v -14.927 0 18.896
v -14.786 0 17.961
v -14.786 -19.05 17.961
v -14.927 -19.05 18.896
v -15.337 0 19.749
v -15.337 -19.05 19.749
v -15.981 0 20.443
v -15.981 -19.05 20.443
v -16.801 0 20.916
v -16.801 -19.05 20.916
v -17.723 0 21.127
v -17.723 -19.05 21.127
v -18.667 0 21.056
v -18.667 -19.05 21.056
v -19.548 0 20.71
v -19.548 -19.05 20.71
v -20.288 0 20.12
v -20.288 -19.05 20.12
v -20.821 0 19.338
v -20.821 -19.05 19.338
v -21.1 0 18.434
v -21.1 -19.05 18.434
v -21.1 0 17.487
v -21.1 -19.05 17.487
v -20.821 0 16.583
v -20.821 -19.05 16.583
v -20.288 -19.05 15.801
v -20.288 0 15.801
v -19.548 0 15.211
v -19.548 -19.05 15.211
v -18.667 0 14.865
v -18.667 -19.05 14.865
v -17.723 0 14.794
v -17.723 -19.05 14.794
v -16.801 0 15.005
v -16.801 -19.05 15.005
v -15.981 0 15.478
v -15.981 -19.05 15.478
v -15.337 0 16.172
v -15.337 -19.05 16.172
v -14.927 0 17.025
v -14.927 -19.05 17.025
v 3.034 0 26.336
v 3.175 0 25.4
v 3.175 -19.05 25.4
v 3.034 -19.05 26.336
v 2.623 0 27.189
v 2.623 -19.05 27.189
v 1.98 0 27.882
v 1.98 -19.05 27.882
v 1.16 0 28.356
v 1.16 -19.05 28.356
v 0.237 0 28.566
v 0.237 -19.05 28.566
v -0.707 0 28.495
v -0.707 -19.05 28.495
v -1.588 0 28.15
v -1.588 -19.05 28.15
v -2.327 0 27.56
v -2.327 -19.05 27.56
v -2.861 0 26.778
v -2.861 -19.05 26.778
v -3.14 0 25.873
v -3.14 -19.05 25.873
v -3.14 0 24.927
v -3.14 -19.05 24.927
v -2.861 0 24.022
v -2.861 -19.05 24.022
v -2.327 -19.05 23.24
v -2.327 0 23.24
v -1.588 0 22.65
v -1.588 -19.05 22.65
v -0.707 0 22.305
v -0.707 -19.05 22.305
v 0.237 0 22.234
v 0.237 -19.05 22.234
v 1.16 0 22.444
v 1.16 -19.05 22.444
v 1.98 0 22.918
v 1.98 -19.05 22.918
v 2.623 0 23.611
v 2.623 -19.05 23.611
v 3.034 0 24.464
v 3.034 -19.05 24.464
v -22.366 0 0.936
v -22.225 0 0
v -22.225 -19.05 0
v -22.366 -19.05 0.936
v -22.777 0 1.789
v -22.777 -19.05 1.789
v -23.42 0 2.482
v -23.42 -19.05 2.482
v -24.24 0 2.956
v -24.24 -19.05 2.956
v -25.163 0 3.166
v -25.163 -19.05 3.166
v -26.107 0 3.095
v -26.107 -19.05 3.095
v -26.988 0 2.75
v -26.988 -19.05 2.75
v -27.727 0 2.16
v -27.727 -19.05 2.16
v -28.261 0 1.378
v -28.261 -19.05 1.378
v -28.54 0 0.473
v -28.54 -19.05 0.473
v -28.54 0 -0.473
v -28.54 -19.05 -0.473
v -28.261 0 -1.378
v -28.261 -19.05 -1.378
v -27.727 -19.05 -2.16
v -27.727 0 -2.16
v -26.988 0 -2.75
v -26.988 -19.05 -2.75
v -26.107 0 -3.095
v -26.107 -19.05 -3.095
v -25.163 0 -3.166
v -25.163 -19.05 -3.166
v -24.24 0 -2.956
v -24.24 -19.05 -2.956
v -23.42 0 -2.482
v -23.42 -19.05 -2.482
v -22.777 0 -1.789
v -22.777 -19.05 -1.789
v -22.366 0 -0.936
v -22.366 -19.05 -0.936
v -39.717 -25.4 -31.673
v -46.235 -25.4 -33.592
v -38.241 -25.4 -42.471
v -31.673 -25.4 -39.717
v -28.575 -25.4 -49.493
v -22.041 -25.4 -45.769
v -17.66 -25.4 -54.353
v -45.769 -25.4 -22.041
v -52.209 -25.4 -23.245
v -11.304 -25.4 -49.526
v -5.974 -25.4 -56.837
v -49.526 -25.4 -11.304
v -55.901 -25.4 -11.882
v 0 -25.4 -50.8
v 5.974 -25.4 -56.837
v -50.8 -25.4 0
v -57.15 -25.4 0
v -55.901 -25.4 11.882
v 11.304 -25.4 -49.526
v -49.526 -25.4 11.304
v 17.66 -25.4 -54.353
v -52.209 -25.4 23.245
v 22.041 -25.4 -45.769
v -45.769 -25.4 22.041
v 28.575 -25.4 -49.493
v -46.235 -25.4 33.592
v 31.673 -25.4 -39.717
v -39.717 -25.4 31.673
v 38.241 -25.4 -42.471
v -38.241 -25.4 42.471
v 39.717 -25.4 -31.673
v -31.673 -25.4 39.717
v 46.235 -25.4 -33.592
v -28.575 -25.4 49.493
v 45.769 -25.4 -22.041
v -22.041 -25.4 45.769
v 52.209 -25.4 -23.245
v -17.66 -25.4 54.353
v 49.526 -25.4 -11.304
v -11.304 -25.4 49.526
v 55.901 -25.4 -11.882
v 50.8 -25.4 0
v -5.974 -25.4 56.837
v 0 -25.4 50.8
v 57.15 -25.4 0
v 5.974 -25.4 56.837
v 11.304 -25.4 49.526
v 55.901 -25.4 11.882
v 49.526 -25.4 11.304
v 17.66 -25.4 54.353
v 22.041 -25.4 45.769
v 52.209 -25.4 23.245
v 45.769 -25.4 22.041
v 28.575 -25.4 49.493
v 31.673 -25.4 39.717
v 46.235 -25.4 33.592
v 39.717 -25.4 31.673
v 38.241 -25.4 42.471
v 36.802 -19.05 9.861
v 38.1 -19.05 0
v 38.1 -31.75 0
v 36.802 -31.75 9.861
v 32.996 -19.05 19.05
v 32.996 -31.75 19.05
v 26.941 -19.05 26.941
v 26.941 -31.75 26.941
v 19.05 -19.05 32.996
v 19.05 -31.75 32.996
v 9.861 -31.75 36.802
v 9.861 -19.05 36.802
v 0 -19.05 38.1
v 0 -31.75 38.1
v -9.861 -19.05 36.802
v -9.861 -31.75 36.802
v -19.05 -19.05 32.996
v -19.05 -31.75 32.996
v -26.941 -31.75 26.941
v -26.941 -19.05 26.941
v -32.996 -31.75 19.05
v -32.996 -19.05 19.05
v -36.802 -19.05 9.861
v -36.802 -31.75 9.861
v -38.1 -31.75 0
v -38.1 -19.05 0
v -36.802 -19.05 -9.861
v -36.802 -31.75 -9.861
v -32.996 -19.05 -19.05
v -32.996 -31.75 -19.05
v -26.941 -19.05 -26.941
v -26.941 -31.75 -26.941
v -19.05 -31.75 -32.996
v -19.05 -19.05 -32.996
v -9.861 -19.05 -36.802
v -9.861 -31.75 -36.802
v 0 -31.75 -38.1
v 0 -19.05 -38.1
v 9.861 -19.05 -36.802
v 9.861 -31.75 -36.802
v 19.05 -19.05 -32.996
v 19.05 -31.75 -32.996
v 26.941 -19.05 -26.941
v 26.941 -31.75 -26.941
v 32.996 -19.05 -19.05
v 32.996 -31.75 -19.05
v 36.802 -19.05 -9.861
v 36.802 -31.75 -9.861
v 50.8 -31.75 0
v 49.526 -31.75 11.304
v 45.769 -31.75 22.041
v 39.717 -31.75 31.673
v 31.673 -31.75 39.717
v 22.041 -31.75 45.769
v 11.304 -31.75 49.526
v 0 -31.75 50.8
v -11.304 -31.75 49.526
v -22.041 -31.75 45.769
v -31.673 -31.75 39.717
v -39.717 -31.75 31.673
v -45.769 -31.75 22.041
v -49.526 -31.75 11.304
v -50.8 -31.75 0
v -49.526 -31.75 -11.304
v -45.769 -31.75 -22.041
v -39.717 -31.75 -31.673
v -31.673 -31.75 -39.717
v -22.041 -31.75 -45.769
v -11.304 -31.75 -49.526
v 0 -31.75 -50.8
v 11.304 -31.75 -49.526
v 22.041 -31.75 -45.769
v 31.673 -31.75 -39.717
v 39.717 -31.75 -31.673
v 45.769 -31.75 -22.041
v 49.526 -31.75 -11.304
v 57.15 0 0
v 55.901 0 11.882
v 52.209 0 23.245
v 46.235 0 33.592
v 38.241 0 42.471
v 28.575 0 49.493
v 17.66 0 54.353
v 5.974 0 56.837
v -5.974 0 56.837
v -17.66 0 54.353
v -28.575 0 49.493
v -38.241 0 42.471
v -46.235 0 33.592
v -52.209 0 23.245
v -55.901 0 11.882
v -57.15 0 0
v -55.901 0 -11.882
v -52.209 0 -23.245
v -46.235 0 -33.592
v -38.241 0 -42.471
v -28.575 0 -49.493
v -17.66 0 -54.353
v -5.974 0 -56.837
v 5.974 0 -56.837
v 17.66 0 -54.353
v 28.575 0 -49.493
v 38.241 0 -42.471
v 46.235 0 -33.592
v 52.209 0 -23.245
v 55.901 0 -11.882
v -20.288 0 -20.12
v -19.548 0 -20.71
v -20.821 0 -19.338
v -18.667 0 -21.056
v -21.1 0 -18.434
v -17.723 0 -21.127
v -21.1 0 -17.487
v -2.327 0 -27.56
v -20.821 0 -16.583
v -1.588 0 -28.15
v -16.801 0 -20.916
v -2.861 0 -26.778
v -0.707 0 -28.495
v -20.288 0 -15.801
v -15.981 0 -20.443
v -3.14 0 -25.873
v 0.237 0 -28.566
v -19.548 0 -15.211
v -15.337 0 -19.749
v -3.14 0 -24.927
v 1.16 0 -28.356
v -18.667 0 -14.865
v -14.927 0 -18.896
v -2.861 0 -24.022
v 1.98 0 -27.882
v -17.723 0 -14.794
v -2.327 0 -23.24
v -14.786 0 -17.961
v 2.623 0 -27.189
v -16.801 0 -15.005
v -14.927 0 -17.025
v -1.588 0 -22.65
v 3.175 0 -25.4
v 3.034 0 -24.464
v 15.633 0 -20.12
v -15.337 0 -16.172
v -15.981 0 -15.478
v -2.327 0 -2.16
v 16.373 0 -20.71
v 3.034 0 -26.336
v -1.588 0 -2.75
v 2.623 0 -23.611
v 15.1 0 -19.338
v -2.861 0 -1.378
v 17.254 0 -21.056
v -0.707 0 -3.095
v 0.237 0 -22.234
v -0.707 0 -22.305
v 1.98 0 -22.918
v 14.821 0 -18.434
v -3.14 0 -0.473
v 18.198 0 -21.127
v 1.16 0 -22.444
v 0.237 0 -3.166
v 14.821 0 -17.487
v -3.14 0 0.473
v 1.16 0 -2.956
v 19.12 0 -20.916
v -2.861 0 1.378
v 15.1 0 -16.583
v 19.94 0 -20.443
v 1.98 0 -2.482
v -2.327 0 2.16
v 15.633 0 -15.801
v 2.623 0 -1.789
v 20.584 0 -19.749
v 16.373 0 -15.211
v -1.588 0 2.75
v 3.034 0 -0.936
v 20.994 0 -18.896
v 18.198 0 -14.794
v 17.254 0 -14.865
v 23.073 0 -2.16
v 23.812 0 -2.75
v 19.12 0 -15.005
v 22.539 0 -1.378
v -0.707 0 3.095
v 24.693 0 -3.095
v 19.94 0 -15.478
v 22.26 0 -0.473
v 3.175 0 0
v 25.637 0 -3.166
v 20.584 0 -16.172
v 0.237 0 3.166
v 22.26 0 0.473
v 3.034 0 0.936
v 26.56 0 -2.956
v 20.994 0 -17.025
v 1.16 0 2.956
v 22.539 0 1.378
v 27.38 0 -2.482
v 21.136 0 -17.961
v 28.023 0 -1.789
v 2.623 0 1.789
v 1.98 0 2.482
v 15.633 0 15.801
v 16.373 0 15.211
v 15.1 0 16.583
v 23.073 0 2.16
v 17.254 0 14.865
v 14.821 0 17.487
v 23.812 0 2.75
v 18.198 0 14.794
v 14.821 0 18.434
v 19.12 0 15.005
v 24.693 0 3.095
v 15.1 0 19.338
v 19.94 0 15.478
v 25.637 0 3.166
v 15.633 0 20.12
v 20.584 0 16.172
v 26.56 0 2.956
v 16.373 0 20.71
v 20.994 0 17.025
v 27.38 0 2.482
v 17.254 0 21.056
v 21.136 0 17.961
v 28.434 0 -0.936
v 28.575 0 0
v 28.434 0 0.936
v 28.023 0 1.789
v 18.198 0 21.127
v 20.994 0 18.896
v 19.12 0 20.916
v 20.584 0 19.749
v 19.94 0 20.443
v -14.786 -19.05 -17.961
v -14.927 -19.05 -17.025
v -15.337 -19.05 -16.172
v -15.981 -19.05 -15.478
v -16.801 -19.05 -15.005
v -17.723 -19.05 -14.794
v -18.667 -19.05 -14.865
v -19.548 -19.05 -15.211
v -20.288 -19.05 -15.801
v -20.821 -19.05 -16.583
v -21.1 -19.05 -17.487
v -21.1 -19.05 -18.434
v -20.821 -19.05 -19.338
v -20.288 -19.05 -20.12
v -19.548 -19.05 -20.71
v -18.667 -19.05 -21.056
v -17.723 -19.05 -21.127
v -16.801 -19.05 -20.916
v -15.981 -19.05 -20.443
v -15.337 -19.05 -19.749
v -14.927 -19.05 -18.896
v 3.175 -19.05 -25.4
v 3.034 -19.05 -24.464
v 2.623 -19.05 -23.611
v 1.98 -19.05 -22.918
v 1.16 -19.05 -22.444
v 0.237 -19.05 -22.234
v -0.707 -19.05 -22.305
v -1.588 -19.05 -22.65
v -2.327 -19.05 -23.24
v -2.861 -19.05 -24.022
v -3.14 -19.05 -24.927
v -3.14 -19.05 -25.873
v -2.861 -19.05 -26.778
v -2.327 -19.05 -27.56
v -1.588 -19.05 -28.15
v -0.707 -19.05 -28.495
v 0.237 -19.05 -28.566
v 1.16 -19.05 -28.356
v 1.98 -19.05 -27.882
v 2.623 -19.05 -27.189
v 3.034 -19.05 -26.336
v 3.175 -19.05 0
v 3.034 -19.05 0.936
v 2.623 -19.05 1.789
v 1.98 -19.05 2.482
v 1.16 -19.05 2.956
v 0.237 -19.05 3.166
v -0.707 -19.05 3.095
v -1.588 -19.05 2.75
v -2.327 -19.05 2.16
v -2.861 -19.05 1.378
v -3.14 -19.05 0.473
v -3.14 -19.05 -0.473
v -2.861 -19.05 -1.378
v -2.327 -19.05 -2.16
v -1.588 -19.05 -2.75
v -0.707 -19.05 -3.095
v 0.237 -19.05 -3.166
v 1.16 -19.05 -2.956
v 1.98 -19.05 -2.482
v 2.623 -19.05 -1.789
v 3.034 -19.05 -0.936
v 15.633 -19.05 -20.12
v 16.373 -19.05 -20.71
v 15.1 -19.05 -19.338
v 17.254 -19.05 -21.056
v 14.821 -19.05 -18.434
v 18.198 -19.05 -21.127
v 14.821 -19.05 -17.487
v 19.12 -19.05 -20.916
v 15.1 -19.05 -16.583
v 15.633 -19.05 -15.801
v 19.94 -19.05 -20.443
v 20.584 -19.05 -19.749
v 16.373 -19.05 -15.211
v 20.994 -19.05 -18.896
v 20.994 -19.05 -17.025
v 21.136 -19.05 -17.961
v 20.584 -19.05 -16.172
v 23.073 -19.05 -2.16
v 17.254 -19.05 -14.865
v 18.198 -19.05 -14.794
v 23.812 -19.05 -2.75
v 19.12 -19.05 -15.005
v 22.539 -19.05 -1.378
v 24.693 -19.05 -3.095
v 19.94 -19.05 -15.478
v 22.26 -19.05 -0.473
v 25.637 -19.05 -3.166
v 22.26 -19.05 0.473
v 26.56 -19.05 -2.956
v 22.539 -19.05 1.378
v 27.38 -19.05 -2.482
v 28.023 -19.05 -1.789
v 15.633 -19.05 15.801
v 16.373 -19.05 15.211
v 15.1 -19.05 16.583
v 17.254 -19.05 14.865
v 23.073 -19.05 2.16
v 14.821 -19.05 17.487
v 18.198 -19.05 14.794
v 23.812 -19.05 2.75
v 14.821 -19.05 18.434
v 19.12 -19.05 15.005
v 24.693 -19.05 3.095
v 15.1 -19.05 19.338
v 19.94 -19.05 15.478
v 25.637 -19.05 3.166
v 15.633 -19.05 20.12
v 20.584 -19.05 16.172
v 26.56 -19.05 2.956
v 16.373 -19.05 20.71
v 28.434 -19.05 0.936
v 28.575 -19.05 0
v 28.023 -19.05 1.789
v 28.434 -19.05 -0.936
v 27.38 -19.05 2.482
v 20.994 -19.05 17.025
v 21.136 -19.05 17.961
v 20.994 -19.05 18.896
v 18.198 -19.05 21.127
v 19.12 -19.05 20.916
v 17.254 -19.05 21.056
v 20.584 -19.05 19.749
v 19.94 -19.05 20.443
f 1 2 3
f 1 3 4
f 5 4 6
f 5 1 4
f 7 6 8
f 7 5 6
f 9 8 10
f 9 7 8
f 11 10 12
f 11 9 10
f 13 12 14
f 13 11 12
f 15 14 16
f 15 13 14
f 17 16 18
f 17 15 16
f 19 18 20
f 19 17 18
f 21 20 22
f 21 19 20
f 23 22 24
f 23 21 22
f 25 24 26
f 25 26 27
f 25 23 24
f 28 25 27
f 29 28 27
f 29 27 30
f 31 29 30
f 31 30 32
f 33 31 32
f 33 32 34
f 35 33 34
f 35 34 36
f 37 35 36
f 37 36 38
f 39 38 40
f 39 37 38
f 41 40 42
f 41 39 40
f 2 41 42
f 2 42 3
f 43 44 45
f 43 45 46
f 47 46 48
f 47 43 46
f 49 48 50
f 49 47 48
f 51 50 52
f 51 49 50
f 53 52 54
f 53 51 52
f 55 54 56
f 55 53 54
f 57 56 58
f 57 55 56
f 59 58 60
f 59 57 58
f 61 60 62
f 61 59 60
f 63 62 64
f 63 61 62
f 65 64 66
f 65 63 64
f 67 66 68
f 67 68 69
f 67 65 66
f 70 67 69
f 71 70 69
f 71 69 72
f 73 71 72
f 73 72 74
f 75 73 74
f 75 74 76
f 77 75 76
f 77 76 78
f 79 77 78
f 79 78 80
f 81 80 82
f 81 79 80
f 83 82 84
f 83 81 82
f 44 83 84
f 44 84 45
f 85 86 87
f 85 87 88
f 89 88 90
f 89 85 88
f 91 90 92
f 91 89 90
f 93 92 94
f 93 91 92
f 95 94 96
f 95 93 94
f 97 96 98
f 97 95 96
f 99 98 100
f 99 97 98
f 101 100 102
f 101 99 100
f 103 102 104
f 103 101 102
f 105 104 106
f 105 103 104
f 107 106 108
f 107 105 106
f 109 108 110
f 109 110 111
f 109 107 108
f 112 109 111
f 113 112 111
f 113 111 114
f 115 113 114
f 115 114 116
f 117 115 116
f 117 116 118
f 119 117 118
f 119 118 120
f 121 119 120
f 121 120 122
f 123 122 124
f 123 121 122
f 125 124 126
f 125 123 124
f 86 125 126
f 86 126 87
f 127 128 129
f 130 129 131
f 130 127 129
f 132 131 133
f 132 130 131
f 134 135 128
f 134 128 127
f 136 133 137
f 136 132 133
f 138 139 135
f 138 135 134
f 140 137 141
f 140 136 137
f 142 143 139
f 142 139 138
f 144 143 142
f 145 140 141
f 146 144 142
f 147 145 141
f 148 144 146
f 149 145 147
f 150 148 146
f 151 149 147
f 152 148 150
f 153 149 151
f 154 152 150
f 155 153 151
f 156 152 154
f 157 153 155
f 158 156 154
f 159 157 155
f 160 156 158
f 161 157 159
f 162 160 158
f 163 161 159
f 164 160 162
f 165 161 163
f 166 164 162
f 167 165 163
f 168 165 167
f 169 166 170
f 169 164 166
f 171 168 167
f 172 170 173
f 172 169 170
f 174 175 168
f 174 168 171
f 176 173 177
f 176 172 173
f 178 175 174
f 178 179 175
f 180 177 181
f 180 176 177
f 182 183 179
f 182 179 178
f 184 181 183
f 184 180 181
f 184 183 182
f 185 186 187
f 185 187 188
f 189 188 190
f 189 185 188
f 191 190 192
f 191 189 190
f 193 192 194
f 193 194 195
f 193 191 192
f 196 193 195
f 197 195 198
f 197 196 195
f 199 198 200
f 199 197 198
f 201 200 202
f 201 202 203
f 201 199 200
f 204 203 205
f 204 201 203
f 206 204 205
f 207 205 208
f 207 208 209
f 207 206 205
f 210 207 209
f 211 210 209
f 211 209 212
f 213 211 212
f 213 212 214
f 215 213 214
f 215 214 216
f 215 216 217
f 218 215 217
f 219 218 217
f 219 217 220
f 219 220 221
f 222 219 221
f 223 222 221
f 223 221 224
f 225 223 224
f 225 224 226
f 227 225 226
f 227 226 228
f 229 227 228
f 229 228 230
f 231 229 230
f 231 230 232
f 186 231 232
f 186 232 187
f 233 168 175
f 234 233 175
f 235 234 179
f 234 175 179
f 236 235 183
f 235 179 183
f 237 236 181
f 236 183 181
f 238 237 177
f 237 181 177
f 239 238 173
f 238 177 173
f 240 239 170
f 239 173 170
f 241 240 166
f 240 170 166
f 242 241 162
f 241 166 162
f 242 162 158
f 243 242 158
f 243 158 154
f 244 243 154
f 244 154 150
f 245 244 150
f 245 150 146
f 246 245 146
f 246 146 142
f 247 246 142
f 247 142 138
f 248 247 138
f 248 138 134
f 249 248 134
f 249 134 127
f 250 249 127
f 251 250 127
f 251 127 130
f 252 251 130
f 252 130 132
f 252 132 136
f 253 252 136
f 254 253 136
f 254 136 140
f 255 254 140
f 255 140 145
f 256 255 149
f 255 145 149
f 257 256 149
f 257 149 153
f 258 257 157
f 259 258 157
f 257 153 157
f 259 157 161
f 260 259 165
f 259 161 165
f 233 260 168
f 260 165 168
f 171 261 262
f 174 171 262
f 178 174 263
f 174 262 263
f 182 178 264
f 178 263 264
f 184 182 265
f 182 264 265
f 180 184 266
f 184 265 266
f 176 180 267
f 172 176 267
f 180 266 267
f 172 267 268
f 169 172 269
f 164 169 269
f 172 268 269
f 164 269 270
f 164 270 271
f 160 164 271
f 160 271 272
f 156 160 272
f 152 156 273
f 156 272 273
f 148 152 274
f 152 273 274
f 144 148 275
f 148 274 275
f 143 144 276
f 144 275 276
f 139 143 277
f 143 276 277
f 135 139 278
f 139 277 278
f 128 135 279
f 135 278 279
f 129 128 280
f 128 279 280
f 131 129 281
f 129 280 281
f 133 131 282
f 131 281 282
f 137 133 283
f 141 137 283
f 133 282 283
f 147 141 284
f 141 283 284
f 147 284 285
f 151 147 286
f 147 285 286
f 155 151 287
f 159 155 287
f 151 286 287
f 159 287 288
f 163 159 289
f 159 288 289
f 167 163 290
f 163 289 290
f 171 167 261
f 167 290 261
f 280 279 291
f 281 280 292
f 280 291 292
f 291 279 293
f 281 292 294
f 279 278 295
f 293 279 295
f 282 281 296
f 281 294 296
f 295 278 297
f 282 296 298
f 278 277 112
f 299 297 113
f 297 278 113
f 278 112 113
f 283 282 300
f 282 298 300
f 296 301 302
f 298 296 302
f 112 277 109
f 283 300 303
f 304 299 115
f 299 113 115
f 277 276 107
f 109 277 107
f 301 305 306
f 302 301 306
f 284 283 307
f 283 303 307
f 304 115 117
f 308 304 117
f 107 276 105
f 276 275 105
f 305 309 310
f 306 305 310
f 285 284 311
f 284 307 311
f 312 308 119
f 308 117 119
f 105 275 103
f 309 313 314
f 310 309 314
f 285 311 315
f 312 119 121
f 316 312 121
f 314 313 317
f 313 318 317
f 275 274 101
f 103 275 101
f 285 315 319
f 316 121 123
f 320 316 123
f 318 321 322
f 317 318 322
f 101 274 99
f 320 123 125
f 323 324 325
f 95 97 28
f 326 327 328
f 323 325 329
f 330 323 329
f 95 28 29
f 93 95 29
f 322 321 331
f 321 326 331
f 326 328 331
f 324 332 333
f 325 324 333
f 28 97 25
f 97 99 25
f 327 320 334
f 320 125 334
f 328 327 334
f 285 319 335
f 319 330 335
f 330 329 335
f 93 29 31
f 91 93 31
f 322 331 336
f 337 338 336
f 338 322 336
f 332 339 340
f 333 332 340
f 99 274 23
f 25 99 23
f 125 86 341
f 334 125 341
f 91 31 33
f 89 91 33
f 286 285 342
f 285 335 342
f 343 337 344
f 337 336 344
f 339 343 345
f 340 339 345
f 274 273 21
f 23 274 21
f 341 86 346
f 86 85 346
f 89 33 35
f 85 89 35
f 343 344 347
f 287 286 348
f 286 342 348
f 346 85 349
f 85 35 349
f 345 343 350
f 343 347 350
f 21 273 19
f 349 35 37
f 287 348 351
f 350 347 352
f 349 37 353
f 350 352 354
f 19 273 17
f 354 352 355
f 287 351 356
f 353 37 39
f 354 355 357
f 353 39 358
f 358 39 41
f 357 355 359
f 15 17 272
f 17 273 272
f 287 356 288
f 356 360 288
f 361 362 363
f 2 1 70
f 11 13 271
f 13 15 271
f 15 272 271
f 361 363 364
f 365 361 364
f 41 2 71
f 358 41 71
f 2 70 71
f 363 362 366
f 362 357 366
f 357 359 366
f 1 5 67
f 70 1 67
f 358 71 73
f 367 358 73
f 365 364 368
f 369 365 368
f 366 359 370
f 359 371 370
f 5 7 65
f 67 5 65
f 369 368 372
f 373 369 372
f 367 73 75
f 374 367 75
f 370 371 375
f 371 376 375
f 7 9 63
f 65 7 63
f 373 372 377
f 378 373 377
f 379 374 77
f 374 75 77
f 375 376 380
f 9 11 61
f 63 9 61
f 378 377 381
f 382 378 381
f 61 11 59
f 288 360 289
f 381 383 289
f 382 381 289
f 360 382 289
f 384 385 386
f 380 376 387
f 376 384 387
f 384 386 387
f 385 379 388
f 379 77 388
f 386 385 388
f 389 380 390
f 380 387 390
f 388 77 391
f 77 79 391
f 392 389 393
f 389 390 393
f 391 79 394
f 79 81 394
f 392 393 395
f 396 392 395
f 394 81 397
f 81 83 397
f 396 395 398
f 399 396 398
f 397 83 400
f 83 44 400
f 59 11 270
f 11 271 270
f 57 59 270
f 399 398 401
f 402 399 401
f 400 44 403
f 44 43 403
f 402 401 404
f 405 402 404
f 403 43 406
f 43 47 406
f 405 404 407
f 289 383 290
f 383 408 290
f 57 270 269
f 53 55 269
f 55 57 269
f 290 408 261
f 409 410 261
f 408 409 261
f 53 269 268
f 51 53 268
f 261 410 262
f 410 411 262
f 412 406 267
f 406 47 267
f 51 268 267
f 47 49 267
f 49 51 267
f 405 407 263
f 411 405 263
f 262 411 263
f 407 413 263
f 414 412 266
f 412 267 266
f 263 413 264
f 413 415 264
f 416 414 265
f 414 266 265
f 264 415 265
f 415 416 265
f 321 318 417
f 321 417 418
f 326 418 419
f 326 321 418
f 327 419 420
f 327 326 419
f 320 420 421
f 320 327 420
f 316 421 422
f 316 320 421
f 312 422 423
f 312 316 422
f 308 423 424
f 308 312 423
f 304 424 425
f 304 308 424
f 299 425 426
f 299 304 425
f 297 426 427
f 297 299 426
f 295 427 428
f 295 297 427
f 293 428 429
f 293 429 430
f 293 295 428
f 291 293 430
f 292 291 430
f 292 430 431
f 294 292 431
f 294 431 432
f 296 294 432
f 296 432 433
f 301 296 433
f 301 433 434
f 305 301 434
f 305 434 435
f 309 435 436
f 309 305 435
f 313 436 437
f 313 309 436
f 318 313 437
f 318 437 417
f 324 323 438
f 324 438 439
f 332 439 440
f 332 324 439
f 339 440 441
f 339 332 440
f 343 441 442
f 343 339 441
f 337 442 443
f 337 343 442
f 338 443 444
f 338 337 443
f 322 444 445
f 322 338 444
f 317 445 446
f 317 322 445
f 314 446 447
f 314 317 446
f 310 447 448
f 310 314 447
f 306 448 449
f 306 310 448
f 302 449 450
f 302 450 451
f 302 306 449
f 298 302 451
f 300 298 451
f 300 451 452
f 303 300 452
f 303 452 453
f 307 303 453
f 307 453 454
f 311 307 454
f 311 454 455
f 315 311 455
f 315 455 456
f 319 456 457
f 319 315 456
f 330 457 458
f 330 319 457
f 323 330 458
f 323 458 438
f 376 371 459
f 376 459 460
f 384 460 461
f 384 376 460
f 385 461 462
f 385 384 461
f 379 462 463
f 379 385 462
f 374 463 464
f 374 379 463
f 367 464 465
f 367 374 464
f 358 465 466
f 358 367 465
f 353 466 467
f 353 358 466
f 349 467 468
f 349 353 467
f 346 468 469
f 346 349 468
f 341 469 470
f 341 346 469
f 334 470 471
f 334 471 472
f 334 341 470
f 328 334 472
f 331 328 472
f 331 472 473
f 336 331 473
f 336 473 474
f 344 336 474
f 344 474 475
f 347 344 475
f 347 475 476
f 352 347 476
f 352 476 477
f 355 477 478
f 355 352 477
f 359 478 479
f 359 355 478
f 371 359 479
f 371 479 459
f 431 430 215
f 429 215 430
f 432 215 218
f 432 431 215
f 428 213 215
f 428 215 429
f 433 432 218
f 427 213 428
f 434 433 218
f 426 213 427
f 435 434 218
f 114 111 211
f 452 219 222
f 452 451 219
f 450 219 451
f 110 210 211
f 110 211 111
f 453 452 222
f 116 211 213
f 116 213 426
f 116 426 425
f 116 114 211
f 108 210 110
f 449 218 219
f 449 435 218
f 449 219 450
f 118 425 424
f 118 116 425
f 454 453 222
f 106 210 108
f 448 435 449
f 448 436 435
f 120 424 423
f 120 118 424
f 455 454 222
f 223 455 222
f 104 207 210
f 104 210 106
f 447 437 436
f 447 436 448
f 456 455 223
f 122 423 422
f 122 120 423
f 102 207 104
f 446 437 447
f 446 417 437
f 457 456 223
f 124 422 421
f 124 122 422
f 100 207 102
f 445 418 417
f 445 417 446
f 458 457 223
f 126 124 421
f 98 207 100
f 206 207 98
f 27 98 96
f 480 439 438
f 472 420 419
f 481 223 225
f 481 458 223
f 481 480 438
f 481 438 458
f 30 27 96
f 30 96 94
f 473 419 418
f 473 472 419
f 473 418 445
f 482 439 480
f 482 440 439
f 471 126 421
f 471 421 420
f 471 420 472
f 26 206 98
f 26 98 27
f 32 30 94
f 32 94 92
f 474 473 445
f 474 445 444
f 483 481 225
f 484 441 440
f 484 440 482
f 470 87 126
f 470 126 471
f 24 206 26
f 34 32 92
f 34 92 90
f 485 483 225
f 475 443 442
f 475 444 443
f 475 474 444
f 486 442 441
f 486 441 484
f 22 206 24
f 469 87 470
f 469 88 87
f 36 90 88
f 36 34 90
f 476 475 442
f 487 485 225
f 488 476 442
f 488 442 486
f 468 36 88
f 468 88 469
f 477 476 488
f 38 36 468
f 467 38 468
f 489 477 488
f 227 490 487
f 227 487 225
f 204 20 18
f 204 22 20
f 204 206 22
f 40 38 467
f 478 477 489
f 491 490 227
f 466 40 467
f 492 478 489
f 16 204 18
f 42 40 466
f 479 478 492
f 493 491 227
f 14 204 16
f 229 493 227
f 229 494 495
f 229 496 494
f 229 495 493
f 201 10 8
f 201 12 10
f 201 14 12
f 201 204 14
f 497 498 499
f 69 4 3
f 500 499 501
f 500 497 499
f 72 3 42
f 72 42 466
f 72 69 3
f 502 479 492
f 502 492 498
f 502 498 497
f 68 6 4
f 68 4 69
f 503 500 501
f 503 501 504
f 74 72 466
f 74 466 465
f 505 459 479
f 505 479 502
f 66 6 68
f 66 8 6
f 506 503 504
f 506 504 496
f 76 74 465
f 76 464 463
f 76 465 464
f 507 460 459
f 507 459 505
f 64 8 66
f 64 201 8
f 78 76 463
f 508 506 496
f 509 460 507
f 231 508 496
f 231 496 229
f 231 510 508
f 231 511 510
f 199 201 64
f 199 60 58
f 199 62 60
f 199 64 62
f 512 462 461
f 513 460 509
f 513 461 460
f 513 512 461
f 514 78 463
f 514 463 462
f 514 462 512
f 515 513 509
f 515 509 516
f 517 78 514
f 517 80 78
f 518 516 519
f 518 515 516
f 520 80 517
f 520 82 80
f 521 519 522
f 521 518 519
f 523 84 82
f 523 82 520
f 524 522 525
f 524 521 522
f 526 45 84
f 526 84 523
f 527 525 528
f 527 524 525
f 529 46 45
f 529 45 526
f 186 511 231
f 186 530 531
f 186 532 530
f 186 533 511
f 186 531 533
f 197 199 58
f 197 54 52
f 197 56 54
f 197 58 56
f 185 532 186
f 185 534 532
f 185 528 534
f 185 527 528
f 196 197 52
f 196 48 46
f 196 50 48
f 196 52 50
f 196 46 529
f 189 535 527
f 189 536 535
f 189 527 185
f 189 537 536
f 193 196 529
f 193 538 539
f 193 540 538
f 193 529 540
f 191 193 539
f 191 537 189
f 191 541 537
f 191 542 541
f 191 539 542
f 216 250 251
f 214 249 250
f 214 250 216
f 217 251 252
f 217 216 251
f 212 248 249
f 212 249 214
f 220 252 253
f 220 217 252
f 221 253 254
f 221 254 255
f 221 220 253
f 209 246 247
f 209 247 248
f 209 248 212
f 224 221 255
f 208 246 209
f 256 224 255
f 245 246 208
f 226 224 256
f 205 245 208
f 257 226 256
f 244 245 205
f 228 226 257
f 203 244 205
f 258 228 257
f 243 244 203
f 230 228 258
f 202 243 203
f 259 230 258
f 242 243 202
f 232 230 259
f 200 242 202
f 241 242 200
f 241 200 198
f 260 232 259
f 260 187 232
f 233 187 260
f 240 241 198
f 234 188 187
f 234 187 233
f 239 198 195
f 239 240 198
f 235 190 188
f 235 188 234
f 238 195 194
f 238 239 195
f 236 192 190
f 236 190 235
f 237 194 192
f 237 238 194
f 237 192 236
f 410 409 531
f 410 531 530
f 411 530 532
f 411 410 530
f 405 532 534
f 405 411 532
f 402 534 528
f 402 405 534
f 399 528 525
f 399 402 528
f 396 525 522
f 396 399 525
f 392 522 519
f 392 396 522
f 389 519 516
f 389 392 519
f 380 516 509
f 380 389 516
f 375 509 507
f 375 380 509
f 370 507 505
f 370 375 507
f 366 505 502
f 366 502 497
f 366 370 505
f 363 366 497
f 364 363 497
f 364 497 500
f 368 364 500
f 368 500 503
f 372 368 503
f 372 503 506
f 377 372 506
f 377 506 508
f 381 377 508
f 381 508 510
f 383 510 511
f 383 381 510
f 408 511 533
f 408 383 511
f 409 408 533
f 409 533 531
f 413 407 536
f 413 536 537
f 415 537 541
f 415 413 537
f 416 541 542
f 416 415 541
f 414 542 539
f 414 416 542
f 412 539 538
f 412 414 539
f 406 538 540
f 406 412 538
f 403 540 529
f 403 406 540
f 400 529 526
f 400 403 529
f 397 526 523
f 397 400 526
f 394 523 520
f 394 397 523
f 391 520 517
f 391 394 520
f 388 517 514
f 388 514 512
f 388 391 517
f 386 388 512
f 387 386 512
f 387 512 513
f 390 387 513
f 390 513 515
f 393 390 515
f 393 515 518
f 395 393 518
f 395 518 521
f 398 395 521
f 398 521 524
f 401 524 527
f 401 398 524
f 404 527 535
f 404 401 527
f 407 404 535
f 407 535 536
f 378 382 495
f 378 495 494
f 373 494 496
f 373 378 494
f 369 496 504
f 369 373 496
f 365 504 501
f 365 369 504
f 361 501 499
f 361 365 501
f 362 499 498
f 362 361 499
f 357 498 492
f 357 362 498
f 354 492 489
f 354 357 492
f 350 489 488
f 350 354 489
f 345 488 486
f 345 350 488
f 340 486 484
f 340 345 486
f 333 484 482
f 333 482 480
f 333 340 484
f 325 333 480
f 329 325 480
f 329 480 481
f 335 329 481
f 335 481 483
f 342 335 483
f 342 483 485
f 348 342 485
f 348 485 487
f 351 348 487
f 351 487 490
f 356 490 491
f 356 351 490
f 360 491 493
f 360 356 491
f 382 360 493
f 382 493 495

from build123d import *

# Parameters (mm, degrees)
F0_R     = 57.15
F0_R_2   = 50.8
F1_DEPTH = 25.4
F0_R_3   = 38.1
F2_DEPTH = 31.75
F0_R_4   = 3.175
F3_DEPTH = 19.05


with BuildPart() as f1:
    # F0 (on Front) → F1 (new body)
    with BuildSketch(Plane.XZ):
        Circle(F0_R)
        Circle(F0_R_2, mode=Mode.SUBTRACT)
    extrude(amount=F1_DEPTH)

    # F0 (on Front) → F2 (join)
    with BuildSketch(Plane.XZ):
        Circle(F0_R_2)
        Circle(F0_R_3, mode=Mode.SUBTRACT)
    extrude(amount=F2_DEPTH)

    # F0 (on Front) → F3 (join)
    with BuildSketch(Plane.XZ):
        Circle(F0_R_3)
        with Locations((-17.960512, -17.960512)):
            Circle(F0_R_4, mode=Mode.SUBTRACT)
        with Locations((0, -25.4)):
            Circle(F0_R_4, mode=Mode.SUBTRACT)
        with Locations((17.960512, -17.960512)):
            Circle(F0_R_4, mode=Mode.SUBTRACT)
        with Locations((-25.4, 0)):
            Circle(F0_R_4, mode=Mode.SUBTRACT)
        with Locations((-17.960512, 17.960512)):
            Circle(F0_R_4, mode=Mode.SUBTRACT)
        Circle(F0_R_4, mode=Mode.SUBTRACT)
        with Locations((25.4, 0)):
            Circle(F0_R_4, mode=Mode.SUBTRACT)
        with Locations((0, 25.4)):
            Circle(F0_R_4, mode=Mode.SUBTRACT)
        with Locations((17.960512, 17.960512)):
            Circle(F0_R_4, mode=Mode.SUBTRACT)
    extrude(amount=F3_DEPTH)


solid = f1.part
